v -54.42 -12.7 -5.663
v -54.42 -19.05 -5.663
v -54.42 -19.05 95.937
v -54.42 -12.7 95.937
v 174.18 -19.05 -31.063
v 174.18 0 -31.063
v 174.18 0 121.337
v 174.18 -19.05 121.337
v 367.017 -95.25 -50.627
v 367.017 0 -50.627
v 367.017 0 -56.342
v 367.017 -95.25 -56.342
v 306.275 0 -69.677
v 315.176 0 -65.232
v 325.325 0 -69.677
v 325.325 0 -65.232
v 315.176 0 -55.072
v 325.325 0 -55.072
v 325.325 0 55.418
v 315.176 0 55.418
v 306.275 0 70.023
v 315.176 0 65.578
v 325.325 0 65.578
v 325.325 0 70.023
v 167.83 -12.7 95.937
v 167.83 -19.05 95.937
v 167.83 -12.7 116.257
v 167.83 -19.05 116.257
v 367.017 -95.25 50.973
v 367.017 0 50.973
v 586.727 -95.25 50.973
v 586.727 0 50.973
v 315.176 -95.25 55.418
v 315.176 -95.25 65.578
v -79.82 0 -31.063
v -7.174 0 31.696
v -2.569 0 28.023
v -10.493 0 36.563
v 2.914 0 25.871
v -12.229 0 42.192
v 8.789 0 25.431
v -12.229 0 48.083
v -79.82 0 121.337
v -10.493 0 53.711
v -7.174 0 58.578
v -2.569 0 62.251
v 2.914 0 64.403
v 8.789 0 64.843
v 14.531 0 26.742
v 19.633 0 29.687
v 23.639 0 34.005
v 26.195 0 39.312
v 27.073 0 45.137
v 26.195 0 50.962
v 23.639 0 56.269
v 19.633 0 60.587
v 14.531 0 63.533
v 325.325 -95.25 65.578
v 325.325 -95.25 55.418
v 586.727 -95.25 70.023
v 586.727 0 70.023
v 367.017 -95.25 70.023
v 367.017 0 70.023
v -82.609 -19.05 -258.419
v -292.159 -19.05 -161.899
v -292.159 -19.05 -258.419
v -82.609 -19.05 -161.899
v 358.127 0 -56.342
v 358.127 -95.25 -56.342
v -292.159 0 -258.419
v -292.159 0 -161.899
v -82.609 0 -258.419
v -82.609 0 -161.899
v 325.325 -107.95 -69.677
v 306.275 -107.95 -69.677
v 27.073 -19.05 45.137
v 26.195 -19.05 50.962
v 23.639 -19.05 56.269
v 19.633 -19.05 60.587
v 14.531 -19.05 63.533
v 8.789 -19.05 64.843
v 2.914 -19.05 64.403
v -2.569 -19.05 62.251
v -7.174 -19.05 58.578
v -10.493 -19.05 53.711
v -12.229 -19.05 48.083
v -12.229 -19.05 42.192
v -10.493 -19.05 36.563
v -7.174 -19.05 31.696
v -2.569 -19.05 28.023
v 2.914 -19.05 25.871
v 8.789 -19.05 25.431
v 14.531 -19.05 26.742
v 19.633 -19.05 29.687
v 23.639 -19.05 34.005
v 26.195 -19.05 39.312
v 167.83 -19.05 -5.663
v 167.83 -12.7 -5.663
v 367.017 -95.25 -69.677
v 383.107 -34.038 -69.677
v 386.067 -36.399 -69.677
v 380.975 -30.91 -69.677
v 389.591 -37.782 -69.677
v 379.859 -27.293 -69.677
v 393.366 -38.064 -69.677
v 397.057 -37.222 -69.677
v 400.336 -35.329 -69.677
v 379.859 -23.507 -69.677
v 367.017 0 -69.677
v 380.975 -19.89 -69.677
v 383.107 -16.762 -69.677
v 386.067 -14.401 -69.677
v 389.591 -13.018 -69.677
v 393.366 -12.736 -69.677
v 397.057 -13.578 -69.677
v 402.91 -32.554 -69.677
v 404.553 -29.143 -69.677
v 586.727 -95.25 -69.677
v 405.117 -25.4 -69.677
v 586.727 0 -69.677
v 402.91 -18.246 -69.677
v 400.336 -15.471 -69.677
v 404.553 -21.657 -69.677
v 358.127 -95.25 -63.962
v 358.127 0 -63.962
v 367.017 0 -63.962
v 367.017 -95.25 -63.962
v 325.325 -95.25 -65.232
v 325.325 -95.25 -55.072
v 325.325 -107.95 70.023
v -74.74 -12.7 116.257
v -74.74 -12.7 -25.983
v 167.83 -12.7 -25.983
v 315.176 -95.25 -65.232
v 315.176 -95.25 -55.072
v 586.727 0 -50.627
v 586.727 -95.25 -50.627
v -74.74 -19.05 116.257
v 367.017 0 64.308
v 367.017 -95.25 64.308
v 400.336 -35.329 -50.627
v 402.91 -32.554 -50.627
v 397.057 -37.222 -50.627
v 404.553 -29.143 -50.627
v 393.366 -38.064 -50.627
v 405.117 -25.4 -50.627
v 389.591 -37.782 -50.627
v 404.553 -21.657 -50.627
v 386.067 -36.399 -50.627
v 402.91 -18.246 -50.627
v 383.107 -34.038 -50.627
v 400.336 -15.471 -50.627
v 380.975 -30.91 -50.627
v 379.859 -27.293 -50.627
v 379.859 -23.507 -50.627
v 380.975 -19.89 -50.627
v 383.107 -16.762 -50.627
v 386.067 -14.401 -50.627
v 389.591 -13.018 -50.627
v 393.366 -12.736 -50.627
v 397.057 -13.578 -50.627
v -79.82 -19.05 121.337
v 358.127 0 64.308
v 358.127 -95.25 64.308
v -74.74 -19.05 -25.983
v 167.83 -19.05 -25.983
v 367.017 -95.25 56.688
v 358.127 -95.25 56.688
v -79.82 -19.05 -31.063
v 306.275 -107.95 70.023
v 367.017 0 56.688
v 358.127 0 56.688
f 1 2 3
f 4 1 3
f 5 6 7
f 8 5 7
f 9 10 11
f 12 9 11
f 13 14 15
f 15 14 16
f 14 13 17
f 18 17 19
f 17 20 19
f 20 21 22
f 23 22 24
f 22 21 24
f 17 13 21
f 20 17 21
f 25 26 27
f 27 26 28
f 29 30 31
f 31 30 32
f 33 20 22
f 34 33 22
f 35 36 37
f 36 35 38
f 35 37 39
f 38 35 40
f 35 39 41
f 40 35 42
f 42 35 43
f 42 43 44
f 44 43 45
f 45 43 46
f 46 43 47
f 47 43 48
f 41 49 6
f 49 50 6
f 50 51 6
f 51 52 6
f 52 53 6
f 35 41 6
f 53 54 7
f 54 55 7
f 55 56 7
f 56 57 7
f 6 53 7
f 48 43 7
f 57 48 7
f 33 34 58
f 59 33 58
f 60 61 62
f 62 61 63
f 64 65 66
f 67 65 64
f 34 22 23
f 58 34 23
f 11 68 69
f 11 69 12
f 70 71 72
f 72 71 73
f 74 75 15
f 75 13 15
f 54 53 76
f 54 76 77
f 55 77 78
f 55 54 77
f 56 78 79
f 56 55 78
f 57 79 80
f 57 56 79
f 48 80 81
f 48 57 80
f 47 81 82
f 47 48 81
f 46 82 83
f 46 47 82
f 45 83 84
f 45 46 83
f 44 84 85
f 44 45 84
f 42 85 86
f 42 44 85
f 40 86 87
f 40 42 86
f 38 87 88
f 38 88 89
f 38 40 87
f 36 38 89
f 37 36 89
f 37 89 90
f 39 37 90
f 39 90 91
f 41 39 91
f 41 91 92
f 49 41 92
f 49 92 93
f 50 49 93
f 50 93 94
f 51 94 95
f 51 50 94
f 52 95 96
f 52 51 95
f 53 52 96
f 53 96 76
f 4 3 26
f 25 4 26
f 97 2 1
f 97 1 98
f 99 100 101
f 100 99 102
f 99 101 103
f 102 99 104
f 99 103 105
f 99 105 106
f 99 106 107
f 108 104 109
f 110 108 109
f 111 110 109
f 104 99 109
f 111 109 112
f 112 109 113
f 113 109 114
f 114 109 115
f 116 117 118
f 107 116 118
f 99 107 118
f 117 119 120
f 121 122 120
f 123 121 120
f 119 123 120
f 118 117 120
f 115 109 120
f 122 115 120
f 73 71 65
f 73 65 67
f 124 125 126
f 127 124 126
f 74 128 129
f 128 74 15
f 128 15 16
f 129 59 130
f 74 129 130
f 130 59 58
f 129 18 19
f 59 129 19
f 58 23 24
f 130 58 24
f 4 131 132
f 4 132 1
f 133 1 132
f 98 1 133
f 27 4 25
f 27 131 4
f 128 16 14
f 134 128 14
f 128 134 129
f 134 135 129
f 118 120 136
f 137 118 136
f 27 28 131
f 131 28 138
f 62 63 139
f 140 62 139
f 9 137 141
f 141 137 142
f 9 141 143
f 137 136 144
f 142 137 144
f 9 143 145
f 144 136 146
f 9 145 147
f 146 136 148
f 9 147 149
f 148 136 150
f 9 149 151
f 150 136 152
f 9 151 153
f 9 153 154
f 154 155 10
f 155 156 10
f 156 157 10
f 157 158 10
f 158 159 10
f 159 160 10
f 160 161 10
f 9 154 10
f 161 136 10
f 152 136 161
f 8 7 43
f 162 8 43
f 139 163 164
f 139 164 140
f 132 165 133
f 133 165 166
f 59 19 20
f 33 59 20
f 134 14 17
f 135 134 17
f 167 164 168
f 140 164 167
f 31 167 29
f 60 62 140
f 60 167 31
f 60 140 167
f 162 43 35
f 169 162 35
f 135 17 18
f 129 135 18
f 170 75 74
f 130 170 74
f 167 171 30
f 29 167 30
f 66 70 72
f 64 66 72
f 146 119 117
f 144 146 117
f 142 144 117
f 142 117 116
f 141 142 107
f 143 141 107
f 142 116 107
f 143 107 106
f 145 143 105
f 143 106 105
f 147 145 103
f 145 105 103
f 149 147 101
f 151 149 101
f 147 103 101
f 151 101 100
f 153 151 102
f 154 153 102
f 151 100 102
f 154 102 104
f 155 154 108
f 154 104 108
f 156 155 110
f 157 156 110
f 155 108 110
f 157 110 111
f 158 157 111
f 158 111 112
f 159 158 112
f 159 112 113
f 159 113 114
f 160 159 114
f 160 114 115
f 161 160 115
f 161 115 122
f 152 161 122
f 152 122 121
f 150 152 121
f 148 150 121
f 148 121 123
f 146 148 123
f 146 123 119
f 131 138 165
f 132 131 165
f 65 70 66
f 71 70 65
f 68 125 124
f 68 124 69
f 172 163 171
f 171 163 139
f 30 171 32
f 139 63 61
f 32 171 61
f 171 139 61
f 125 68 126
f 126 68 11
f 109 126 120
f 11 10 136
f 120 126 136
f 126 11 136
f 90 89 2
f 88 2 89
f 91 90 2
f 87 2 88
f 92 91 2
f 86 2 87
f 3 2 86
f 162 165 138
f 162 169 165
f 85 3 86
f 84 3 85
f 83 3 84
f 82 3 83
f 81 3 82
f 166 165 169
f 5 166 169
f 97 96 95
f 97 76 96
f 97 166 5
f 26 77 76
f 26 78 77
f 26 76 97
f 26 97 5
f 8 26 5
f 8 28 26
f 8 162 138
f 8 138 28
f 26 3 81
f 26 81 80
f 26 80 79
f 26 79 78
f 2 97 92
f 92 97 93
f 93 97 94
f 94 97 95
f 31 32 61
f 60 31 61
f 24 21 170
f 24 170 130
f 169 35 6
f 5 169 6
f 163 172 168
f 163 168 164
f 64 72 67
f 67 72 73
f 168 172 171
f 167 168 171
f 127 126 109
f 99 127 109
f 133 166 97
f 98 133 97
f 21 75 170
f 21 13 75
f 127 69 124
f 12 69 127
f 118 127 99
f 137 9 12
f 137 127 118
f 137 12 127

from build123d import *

# Parameters (mm, degrees)
F0_R     = 19.7613438491
F0_W     = 222.25
F0_H     = 20.32
F0_W_2   = 6.35
F1_DEPTH = 19.05
F2_W     = 222.25
F2_H     = 20.32
F3_DEPTH = 6.35
F4_DEPTH = 95.25
F0_W_3   = 8.89
F0_H_2   = 7.62
F5_R     = 12.7
F6_DEPTH = 191.0149866296
F7_W     = 19.05
F7_H     = 139.7
F8_DEPTH = 12.7
F0_W_4   = 209.55
F0_H_3   = 96.52
F9_DEPTH = 19.05


# Not quite as in the source:
# - a feature names something its author has since deleted; it is built from what else it names


with BuildPart() as f1:
    # F0 (on Front) → F1 (new body)
    with BuildSketch(Plane.XZ):
        Polygon((167.8302989408, 95.9372372214), (167.8302989408, 116.2572372214), (-74.7397010592, 116.2572372214), (-74.7397010592, -25.9827627786), (-54.4197010592, -25.9827627786), (-54.4197010592, -5.6627627786), (-54.4197010592, 95.9372372214), align=None)
        Polygon((174.1802989408, -5.6627627786), (174.1802989408, 95.9372372214), (167.8302989408, 95.9372372214), (-54.4197010592, 95.9372372214), (-54.4197010592, -5.6627627786), (167.8302989408, -5.6627627786), align=None)
        with Locations((7.3118018918, 45.1372372214)):
            Circle(F0_R, mode=Mode.SUBTRACT)
        with Locations((56.7052989408, -15.8227627786)):
            Rectangle(F0_W, F0_H)
        Polygon((174.1802989408, 121.3372372214), (-79.8197010592, 121.3372372214), (-79.8197010592, -31.0627627786), (174.1802989408, -31.0627627786), (174.1802989408, -25.9827627786), (167.8302989408, -25.9827627786), (-54.4197010592, -25.9827627786), (-74.7397010592, -25.9827627786), (-74.7397010592, 116.2572372214), (167.8302989408, 116.2572372214), (174.1802989408, 116.2572372214), align=None)
        with Locations((171.0052989408, 106.0972372214)):
            Rectangle(F0_W_2, F0_H)
        with Locations((171.0052989408, -15.8227627786)):
            Rectangle(F0_W_2, F0_H)
    extrude(amount=F1_DEPTH)

    # F2 (on face) → F3 (cut)
    with BuildSketch(Plane.XZ.offset(19.05)):
        Polygon((-54.4197010592, 116.2572372214), (-74.7397010592, 116.2572372214), (-74.7397010592, -25.9827627786), (-54.4197010592, -25.9827627786), (-54.4197010592, -5.6627627786), (-54.4197010592, 95.9372372214), align=None)
        with Locations((56.7052989408, 106.0972372214)):
            Rectangle(F2_W, F2_H)
        with Locations((56.7052989408, -15.8227627786)):
            Rectangle(F2_W, F2_H)
    extrude(amount=-F3_DEPTH, mode=Mode.SUBTRACT)


with BuildPart() as f4:
    # F0 (on Front) → F4 (new body)
    with BuildSketch(Plane.XZ):
        Polygon((325.3248014927, 70.0232505918), (306.2748014927, 70.0232505918), (306.2748014927, -69.6767494082), (325.3248014927, -69.6767494082), (325.3248014927, -65.2317494082), (315.1758867264, -65.2317494082), (315.1758867264, -55.0717494082), (325.3248014927, -55.0717494082), (325.3248014927, 55.4182505918), (315.1758867264, 55.4182505918), (315.1758867264, 65.5782505918), (325.3248014927, 65.5782505918), align=None)
    extrude(amount=F4_DEPTH)

    # F7 (on face) → F8 (join)
    with BuildSketch(Plane.XZ.offset(95.25)):
        with Locations((315.7998014927, 0.1732505918)):
            Rectangle(F7_W, F7_H)
    extrude(amount=F8_DEPTH)


with BuildPart() as f4b:
    # F0 (on Front) → F4, piece 2 (new body)
    with BuildSketch(Plane.XZ):
        Polygon((586.7272095299, 70.0232505918), (367.0172095299, 70.0232505918), (367.0172095299, 64.3082505918), (367.0172095299, 56.6882505918), (367.0172095299, 50.9732505918), (586.7272095299, 50.9732505918), align=None)
        with Locations((362.5722095299, 60.4982505918)):
            Rectangle(F0_W_3, F0_H_2)
    extrude(amount=F4_DEPTH)


with BuildPart() as f4c:
    # F0 (on Front) → F4, piece 3 (new body)
    with BuildSketch(Plane.XZ):
        Polygon((586.7272095299, -50.6267494082), (367.0172095299, -50.6267494082), (367.0172095299, -56.3417494082), (367.0172095299, -63.9617494082), (367.0172095299, -69.6767494082), (586.7272095299, -69.6767494082), align=None)
        with Locations((362.5722095299, -60.1517494082)):
            Rectangle(F0_W_3, F0_H_2)
    extrude(amount=F4_DEPTH)

    # F5 (on face) → F6 (cut, through all)
    with BuildSketch(Plane(origin=(0, 0, -69.6767494082), x_dir=(1, 0, 0), z_dir=(0, 0, -1))):
        with Locations((392.4172095299, 25.4)):
            Circle(F5_R)
    extrude(amount=-F6_DEPTH, mode=Mode.SUBTRACT)


with BuildPart() as f9:
    # F0 (on Front) → F9 (new body)
    with BuildSketch(Plane.XZ):
        with Locations((-187.3835738659, -210.1594242954)):
            Rectangle(F0_W_4, F0_H_3)
    extrude(amount=F9_DEPTH)


solid = Compound([f1.part, f4.part, f4b.part, f4c.part, f9.part])
